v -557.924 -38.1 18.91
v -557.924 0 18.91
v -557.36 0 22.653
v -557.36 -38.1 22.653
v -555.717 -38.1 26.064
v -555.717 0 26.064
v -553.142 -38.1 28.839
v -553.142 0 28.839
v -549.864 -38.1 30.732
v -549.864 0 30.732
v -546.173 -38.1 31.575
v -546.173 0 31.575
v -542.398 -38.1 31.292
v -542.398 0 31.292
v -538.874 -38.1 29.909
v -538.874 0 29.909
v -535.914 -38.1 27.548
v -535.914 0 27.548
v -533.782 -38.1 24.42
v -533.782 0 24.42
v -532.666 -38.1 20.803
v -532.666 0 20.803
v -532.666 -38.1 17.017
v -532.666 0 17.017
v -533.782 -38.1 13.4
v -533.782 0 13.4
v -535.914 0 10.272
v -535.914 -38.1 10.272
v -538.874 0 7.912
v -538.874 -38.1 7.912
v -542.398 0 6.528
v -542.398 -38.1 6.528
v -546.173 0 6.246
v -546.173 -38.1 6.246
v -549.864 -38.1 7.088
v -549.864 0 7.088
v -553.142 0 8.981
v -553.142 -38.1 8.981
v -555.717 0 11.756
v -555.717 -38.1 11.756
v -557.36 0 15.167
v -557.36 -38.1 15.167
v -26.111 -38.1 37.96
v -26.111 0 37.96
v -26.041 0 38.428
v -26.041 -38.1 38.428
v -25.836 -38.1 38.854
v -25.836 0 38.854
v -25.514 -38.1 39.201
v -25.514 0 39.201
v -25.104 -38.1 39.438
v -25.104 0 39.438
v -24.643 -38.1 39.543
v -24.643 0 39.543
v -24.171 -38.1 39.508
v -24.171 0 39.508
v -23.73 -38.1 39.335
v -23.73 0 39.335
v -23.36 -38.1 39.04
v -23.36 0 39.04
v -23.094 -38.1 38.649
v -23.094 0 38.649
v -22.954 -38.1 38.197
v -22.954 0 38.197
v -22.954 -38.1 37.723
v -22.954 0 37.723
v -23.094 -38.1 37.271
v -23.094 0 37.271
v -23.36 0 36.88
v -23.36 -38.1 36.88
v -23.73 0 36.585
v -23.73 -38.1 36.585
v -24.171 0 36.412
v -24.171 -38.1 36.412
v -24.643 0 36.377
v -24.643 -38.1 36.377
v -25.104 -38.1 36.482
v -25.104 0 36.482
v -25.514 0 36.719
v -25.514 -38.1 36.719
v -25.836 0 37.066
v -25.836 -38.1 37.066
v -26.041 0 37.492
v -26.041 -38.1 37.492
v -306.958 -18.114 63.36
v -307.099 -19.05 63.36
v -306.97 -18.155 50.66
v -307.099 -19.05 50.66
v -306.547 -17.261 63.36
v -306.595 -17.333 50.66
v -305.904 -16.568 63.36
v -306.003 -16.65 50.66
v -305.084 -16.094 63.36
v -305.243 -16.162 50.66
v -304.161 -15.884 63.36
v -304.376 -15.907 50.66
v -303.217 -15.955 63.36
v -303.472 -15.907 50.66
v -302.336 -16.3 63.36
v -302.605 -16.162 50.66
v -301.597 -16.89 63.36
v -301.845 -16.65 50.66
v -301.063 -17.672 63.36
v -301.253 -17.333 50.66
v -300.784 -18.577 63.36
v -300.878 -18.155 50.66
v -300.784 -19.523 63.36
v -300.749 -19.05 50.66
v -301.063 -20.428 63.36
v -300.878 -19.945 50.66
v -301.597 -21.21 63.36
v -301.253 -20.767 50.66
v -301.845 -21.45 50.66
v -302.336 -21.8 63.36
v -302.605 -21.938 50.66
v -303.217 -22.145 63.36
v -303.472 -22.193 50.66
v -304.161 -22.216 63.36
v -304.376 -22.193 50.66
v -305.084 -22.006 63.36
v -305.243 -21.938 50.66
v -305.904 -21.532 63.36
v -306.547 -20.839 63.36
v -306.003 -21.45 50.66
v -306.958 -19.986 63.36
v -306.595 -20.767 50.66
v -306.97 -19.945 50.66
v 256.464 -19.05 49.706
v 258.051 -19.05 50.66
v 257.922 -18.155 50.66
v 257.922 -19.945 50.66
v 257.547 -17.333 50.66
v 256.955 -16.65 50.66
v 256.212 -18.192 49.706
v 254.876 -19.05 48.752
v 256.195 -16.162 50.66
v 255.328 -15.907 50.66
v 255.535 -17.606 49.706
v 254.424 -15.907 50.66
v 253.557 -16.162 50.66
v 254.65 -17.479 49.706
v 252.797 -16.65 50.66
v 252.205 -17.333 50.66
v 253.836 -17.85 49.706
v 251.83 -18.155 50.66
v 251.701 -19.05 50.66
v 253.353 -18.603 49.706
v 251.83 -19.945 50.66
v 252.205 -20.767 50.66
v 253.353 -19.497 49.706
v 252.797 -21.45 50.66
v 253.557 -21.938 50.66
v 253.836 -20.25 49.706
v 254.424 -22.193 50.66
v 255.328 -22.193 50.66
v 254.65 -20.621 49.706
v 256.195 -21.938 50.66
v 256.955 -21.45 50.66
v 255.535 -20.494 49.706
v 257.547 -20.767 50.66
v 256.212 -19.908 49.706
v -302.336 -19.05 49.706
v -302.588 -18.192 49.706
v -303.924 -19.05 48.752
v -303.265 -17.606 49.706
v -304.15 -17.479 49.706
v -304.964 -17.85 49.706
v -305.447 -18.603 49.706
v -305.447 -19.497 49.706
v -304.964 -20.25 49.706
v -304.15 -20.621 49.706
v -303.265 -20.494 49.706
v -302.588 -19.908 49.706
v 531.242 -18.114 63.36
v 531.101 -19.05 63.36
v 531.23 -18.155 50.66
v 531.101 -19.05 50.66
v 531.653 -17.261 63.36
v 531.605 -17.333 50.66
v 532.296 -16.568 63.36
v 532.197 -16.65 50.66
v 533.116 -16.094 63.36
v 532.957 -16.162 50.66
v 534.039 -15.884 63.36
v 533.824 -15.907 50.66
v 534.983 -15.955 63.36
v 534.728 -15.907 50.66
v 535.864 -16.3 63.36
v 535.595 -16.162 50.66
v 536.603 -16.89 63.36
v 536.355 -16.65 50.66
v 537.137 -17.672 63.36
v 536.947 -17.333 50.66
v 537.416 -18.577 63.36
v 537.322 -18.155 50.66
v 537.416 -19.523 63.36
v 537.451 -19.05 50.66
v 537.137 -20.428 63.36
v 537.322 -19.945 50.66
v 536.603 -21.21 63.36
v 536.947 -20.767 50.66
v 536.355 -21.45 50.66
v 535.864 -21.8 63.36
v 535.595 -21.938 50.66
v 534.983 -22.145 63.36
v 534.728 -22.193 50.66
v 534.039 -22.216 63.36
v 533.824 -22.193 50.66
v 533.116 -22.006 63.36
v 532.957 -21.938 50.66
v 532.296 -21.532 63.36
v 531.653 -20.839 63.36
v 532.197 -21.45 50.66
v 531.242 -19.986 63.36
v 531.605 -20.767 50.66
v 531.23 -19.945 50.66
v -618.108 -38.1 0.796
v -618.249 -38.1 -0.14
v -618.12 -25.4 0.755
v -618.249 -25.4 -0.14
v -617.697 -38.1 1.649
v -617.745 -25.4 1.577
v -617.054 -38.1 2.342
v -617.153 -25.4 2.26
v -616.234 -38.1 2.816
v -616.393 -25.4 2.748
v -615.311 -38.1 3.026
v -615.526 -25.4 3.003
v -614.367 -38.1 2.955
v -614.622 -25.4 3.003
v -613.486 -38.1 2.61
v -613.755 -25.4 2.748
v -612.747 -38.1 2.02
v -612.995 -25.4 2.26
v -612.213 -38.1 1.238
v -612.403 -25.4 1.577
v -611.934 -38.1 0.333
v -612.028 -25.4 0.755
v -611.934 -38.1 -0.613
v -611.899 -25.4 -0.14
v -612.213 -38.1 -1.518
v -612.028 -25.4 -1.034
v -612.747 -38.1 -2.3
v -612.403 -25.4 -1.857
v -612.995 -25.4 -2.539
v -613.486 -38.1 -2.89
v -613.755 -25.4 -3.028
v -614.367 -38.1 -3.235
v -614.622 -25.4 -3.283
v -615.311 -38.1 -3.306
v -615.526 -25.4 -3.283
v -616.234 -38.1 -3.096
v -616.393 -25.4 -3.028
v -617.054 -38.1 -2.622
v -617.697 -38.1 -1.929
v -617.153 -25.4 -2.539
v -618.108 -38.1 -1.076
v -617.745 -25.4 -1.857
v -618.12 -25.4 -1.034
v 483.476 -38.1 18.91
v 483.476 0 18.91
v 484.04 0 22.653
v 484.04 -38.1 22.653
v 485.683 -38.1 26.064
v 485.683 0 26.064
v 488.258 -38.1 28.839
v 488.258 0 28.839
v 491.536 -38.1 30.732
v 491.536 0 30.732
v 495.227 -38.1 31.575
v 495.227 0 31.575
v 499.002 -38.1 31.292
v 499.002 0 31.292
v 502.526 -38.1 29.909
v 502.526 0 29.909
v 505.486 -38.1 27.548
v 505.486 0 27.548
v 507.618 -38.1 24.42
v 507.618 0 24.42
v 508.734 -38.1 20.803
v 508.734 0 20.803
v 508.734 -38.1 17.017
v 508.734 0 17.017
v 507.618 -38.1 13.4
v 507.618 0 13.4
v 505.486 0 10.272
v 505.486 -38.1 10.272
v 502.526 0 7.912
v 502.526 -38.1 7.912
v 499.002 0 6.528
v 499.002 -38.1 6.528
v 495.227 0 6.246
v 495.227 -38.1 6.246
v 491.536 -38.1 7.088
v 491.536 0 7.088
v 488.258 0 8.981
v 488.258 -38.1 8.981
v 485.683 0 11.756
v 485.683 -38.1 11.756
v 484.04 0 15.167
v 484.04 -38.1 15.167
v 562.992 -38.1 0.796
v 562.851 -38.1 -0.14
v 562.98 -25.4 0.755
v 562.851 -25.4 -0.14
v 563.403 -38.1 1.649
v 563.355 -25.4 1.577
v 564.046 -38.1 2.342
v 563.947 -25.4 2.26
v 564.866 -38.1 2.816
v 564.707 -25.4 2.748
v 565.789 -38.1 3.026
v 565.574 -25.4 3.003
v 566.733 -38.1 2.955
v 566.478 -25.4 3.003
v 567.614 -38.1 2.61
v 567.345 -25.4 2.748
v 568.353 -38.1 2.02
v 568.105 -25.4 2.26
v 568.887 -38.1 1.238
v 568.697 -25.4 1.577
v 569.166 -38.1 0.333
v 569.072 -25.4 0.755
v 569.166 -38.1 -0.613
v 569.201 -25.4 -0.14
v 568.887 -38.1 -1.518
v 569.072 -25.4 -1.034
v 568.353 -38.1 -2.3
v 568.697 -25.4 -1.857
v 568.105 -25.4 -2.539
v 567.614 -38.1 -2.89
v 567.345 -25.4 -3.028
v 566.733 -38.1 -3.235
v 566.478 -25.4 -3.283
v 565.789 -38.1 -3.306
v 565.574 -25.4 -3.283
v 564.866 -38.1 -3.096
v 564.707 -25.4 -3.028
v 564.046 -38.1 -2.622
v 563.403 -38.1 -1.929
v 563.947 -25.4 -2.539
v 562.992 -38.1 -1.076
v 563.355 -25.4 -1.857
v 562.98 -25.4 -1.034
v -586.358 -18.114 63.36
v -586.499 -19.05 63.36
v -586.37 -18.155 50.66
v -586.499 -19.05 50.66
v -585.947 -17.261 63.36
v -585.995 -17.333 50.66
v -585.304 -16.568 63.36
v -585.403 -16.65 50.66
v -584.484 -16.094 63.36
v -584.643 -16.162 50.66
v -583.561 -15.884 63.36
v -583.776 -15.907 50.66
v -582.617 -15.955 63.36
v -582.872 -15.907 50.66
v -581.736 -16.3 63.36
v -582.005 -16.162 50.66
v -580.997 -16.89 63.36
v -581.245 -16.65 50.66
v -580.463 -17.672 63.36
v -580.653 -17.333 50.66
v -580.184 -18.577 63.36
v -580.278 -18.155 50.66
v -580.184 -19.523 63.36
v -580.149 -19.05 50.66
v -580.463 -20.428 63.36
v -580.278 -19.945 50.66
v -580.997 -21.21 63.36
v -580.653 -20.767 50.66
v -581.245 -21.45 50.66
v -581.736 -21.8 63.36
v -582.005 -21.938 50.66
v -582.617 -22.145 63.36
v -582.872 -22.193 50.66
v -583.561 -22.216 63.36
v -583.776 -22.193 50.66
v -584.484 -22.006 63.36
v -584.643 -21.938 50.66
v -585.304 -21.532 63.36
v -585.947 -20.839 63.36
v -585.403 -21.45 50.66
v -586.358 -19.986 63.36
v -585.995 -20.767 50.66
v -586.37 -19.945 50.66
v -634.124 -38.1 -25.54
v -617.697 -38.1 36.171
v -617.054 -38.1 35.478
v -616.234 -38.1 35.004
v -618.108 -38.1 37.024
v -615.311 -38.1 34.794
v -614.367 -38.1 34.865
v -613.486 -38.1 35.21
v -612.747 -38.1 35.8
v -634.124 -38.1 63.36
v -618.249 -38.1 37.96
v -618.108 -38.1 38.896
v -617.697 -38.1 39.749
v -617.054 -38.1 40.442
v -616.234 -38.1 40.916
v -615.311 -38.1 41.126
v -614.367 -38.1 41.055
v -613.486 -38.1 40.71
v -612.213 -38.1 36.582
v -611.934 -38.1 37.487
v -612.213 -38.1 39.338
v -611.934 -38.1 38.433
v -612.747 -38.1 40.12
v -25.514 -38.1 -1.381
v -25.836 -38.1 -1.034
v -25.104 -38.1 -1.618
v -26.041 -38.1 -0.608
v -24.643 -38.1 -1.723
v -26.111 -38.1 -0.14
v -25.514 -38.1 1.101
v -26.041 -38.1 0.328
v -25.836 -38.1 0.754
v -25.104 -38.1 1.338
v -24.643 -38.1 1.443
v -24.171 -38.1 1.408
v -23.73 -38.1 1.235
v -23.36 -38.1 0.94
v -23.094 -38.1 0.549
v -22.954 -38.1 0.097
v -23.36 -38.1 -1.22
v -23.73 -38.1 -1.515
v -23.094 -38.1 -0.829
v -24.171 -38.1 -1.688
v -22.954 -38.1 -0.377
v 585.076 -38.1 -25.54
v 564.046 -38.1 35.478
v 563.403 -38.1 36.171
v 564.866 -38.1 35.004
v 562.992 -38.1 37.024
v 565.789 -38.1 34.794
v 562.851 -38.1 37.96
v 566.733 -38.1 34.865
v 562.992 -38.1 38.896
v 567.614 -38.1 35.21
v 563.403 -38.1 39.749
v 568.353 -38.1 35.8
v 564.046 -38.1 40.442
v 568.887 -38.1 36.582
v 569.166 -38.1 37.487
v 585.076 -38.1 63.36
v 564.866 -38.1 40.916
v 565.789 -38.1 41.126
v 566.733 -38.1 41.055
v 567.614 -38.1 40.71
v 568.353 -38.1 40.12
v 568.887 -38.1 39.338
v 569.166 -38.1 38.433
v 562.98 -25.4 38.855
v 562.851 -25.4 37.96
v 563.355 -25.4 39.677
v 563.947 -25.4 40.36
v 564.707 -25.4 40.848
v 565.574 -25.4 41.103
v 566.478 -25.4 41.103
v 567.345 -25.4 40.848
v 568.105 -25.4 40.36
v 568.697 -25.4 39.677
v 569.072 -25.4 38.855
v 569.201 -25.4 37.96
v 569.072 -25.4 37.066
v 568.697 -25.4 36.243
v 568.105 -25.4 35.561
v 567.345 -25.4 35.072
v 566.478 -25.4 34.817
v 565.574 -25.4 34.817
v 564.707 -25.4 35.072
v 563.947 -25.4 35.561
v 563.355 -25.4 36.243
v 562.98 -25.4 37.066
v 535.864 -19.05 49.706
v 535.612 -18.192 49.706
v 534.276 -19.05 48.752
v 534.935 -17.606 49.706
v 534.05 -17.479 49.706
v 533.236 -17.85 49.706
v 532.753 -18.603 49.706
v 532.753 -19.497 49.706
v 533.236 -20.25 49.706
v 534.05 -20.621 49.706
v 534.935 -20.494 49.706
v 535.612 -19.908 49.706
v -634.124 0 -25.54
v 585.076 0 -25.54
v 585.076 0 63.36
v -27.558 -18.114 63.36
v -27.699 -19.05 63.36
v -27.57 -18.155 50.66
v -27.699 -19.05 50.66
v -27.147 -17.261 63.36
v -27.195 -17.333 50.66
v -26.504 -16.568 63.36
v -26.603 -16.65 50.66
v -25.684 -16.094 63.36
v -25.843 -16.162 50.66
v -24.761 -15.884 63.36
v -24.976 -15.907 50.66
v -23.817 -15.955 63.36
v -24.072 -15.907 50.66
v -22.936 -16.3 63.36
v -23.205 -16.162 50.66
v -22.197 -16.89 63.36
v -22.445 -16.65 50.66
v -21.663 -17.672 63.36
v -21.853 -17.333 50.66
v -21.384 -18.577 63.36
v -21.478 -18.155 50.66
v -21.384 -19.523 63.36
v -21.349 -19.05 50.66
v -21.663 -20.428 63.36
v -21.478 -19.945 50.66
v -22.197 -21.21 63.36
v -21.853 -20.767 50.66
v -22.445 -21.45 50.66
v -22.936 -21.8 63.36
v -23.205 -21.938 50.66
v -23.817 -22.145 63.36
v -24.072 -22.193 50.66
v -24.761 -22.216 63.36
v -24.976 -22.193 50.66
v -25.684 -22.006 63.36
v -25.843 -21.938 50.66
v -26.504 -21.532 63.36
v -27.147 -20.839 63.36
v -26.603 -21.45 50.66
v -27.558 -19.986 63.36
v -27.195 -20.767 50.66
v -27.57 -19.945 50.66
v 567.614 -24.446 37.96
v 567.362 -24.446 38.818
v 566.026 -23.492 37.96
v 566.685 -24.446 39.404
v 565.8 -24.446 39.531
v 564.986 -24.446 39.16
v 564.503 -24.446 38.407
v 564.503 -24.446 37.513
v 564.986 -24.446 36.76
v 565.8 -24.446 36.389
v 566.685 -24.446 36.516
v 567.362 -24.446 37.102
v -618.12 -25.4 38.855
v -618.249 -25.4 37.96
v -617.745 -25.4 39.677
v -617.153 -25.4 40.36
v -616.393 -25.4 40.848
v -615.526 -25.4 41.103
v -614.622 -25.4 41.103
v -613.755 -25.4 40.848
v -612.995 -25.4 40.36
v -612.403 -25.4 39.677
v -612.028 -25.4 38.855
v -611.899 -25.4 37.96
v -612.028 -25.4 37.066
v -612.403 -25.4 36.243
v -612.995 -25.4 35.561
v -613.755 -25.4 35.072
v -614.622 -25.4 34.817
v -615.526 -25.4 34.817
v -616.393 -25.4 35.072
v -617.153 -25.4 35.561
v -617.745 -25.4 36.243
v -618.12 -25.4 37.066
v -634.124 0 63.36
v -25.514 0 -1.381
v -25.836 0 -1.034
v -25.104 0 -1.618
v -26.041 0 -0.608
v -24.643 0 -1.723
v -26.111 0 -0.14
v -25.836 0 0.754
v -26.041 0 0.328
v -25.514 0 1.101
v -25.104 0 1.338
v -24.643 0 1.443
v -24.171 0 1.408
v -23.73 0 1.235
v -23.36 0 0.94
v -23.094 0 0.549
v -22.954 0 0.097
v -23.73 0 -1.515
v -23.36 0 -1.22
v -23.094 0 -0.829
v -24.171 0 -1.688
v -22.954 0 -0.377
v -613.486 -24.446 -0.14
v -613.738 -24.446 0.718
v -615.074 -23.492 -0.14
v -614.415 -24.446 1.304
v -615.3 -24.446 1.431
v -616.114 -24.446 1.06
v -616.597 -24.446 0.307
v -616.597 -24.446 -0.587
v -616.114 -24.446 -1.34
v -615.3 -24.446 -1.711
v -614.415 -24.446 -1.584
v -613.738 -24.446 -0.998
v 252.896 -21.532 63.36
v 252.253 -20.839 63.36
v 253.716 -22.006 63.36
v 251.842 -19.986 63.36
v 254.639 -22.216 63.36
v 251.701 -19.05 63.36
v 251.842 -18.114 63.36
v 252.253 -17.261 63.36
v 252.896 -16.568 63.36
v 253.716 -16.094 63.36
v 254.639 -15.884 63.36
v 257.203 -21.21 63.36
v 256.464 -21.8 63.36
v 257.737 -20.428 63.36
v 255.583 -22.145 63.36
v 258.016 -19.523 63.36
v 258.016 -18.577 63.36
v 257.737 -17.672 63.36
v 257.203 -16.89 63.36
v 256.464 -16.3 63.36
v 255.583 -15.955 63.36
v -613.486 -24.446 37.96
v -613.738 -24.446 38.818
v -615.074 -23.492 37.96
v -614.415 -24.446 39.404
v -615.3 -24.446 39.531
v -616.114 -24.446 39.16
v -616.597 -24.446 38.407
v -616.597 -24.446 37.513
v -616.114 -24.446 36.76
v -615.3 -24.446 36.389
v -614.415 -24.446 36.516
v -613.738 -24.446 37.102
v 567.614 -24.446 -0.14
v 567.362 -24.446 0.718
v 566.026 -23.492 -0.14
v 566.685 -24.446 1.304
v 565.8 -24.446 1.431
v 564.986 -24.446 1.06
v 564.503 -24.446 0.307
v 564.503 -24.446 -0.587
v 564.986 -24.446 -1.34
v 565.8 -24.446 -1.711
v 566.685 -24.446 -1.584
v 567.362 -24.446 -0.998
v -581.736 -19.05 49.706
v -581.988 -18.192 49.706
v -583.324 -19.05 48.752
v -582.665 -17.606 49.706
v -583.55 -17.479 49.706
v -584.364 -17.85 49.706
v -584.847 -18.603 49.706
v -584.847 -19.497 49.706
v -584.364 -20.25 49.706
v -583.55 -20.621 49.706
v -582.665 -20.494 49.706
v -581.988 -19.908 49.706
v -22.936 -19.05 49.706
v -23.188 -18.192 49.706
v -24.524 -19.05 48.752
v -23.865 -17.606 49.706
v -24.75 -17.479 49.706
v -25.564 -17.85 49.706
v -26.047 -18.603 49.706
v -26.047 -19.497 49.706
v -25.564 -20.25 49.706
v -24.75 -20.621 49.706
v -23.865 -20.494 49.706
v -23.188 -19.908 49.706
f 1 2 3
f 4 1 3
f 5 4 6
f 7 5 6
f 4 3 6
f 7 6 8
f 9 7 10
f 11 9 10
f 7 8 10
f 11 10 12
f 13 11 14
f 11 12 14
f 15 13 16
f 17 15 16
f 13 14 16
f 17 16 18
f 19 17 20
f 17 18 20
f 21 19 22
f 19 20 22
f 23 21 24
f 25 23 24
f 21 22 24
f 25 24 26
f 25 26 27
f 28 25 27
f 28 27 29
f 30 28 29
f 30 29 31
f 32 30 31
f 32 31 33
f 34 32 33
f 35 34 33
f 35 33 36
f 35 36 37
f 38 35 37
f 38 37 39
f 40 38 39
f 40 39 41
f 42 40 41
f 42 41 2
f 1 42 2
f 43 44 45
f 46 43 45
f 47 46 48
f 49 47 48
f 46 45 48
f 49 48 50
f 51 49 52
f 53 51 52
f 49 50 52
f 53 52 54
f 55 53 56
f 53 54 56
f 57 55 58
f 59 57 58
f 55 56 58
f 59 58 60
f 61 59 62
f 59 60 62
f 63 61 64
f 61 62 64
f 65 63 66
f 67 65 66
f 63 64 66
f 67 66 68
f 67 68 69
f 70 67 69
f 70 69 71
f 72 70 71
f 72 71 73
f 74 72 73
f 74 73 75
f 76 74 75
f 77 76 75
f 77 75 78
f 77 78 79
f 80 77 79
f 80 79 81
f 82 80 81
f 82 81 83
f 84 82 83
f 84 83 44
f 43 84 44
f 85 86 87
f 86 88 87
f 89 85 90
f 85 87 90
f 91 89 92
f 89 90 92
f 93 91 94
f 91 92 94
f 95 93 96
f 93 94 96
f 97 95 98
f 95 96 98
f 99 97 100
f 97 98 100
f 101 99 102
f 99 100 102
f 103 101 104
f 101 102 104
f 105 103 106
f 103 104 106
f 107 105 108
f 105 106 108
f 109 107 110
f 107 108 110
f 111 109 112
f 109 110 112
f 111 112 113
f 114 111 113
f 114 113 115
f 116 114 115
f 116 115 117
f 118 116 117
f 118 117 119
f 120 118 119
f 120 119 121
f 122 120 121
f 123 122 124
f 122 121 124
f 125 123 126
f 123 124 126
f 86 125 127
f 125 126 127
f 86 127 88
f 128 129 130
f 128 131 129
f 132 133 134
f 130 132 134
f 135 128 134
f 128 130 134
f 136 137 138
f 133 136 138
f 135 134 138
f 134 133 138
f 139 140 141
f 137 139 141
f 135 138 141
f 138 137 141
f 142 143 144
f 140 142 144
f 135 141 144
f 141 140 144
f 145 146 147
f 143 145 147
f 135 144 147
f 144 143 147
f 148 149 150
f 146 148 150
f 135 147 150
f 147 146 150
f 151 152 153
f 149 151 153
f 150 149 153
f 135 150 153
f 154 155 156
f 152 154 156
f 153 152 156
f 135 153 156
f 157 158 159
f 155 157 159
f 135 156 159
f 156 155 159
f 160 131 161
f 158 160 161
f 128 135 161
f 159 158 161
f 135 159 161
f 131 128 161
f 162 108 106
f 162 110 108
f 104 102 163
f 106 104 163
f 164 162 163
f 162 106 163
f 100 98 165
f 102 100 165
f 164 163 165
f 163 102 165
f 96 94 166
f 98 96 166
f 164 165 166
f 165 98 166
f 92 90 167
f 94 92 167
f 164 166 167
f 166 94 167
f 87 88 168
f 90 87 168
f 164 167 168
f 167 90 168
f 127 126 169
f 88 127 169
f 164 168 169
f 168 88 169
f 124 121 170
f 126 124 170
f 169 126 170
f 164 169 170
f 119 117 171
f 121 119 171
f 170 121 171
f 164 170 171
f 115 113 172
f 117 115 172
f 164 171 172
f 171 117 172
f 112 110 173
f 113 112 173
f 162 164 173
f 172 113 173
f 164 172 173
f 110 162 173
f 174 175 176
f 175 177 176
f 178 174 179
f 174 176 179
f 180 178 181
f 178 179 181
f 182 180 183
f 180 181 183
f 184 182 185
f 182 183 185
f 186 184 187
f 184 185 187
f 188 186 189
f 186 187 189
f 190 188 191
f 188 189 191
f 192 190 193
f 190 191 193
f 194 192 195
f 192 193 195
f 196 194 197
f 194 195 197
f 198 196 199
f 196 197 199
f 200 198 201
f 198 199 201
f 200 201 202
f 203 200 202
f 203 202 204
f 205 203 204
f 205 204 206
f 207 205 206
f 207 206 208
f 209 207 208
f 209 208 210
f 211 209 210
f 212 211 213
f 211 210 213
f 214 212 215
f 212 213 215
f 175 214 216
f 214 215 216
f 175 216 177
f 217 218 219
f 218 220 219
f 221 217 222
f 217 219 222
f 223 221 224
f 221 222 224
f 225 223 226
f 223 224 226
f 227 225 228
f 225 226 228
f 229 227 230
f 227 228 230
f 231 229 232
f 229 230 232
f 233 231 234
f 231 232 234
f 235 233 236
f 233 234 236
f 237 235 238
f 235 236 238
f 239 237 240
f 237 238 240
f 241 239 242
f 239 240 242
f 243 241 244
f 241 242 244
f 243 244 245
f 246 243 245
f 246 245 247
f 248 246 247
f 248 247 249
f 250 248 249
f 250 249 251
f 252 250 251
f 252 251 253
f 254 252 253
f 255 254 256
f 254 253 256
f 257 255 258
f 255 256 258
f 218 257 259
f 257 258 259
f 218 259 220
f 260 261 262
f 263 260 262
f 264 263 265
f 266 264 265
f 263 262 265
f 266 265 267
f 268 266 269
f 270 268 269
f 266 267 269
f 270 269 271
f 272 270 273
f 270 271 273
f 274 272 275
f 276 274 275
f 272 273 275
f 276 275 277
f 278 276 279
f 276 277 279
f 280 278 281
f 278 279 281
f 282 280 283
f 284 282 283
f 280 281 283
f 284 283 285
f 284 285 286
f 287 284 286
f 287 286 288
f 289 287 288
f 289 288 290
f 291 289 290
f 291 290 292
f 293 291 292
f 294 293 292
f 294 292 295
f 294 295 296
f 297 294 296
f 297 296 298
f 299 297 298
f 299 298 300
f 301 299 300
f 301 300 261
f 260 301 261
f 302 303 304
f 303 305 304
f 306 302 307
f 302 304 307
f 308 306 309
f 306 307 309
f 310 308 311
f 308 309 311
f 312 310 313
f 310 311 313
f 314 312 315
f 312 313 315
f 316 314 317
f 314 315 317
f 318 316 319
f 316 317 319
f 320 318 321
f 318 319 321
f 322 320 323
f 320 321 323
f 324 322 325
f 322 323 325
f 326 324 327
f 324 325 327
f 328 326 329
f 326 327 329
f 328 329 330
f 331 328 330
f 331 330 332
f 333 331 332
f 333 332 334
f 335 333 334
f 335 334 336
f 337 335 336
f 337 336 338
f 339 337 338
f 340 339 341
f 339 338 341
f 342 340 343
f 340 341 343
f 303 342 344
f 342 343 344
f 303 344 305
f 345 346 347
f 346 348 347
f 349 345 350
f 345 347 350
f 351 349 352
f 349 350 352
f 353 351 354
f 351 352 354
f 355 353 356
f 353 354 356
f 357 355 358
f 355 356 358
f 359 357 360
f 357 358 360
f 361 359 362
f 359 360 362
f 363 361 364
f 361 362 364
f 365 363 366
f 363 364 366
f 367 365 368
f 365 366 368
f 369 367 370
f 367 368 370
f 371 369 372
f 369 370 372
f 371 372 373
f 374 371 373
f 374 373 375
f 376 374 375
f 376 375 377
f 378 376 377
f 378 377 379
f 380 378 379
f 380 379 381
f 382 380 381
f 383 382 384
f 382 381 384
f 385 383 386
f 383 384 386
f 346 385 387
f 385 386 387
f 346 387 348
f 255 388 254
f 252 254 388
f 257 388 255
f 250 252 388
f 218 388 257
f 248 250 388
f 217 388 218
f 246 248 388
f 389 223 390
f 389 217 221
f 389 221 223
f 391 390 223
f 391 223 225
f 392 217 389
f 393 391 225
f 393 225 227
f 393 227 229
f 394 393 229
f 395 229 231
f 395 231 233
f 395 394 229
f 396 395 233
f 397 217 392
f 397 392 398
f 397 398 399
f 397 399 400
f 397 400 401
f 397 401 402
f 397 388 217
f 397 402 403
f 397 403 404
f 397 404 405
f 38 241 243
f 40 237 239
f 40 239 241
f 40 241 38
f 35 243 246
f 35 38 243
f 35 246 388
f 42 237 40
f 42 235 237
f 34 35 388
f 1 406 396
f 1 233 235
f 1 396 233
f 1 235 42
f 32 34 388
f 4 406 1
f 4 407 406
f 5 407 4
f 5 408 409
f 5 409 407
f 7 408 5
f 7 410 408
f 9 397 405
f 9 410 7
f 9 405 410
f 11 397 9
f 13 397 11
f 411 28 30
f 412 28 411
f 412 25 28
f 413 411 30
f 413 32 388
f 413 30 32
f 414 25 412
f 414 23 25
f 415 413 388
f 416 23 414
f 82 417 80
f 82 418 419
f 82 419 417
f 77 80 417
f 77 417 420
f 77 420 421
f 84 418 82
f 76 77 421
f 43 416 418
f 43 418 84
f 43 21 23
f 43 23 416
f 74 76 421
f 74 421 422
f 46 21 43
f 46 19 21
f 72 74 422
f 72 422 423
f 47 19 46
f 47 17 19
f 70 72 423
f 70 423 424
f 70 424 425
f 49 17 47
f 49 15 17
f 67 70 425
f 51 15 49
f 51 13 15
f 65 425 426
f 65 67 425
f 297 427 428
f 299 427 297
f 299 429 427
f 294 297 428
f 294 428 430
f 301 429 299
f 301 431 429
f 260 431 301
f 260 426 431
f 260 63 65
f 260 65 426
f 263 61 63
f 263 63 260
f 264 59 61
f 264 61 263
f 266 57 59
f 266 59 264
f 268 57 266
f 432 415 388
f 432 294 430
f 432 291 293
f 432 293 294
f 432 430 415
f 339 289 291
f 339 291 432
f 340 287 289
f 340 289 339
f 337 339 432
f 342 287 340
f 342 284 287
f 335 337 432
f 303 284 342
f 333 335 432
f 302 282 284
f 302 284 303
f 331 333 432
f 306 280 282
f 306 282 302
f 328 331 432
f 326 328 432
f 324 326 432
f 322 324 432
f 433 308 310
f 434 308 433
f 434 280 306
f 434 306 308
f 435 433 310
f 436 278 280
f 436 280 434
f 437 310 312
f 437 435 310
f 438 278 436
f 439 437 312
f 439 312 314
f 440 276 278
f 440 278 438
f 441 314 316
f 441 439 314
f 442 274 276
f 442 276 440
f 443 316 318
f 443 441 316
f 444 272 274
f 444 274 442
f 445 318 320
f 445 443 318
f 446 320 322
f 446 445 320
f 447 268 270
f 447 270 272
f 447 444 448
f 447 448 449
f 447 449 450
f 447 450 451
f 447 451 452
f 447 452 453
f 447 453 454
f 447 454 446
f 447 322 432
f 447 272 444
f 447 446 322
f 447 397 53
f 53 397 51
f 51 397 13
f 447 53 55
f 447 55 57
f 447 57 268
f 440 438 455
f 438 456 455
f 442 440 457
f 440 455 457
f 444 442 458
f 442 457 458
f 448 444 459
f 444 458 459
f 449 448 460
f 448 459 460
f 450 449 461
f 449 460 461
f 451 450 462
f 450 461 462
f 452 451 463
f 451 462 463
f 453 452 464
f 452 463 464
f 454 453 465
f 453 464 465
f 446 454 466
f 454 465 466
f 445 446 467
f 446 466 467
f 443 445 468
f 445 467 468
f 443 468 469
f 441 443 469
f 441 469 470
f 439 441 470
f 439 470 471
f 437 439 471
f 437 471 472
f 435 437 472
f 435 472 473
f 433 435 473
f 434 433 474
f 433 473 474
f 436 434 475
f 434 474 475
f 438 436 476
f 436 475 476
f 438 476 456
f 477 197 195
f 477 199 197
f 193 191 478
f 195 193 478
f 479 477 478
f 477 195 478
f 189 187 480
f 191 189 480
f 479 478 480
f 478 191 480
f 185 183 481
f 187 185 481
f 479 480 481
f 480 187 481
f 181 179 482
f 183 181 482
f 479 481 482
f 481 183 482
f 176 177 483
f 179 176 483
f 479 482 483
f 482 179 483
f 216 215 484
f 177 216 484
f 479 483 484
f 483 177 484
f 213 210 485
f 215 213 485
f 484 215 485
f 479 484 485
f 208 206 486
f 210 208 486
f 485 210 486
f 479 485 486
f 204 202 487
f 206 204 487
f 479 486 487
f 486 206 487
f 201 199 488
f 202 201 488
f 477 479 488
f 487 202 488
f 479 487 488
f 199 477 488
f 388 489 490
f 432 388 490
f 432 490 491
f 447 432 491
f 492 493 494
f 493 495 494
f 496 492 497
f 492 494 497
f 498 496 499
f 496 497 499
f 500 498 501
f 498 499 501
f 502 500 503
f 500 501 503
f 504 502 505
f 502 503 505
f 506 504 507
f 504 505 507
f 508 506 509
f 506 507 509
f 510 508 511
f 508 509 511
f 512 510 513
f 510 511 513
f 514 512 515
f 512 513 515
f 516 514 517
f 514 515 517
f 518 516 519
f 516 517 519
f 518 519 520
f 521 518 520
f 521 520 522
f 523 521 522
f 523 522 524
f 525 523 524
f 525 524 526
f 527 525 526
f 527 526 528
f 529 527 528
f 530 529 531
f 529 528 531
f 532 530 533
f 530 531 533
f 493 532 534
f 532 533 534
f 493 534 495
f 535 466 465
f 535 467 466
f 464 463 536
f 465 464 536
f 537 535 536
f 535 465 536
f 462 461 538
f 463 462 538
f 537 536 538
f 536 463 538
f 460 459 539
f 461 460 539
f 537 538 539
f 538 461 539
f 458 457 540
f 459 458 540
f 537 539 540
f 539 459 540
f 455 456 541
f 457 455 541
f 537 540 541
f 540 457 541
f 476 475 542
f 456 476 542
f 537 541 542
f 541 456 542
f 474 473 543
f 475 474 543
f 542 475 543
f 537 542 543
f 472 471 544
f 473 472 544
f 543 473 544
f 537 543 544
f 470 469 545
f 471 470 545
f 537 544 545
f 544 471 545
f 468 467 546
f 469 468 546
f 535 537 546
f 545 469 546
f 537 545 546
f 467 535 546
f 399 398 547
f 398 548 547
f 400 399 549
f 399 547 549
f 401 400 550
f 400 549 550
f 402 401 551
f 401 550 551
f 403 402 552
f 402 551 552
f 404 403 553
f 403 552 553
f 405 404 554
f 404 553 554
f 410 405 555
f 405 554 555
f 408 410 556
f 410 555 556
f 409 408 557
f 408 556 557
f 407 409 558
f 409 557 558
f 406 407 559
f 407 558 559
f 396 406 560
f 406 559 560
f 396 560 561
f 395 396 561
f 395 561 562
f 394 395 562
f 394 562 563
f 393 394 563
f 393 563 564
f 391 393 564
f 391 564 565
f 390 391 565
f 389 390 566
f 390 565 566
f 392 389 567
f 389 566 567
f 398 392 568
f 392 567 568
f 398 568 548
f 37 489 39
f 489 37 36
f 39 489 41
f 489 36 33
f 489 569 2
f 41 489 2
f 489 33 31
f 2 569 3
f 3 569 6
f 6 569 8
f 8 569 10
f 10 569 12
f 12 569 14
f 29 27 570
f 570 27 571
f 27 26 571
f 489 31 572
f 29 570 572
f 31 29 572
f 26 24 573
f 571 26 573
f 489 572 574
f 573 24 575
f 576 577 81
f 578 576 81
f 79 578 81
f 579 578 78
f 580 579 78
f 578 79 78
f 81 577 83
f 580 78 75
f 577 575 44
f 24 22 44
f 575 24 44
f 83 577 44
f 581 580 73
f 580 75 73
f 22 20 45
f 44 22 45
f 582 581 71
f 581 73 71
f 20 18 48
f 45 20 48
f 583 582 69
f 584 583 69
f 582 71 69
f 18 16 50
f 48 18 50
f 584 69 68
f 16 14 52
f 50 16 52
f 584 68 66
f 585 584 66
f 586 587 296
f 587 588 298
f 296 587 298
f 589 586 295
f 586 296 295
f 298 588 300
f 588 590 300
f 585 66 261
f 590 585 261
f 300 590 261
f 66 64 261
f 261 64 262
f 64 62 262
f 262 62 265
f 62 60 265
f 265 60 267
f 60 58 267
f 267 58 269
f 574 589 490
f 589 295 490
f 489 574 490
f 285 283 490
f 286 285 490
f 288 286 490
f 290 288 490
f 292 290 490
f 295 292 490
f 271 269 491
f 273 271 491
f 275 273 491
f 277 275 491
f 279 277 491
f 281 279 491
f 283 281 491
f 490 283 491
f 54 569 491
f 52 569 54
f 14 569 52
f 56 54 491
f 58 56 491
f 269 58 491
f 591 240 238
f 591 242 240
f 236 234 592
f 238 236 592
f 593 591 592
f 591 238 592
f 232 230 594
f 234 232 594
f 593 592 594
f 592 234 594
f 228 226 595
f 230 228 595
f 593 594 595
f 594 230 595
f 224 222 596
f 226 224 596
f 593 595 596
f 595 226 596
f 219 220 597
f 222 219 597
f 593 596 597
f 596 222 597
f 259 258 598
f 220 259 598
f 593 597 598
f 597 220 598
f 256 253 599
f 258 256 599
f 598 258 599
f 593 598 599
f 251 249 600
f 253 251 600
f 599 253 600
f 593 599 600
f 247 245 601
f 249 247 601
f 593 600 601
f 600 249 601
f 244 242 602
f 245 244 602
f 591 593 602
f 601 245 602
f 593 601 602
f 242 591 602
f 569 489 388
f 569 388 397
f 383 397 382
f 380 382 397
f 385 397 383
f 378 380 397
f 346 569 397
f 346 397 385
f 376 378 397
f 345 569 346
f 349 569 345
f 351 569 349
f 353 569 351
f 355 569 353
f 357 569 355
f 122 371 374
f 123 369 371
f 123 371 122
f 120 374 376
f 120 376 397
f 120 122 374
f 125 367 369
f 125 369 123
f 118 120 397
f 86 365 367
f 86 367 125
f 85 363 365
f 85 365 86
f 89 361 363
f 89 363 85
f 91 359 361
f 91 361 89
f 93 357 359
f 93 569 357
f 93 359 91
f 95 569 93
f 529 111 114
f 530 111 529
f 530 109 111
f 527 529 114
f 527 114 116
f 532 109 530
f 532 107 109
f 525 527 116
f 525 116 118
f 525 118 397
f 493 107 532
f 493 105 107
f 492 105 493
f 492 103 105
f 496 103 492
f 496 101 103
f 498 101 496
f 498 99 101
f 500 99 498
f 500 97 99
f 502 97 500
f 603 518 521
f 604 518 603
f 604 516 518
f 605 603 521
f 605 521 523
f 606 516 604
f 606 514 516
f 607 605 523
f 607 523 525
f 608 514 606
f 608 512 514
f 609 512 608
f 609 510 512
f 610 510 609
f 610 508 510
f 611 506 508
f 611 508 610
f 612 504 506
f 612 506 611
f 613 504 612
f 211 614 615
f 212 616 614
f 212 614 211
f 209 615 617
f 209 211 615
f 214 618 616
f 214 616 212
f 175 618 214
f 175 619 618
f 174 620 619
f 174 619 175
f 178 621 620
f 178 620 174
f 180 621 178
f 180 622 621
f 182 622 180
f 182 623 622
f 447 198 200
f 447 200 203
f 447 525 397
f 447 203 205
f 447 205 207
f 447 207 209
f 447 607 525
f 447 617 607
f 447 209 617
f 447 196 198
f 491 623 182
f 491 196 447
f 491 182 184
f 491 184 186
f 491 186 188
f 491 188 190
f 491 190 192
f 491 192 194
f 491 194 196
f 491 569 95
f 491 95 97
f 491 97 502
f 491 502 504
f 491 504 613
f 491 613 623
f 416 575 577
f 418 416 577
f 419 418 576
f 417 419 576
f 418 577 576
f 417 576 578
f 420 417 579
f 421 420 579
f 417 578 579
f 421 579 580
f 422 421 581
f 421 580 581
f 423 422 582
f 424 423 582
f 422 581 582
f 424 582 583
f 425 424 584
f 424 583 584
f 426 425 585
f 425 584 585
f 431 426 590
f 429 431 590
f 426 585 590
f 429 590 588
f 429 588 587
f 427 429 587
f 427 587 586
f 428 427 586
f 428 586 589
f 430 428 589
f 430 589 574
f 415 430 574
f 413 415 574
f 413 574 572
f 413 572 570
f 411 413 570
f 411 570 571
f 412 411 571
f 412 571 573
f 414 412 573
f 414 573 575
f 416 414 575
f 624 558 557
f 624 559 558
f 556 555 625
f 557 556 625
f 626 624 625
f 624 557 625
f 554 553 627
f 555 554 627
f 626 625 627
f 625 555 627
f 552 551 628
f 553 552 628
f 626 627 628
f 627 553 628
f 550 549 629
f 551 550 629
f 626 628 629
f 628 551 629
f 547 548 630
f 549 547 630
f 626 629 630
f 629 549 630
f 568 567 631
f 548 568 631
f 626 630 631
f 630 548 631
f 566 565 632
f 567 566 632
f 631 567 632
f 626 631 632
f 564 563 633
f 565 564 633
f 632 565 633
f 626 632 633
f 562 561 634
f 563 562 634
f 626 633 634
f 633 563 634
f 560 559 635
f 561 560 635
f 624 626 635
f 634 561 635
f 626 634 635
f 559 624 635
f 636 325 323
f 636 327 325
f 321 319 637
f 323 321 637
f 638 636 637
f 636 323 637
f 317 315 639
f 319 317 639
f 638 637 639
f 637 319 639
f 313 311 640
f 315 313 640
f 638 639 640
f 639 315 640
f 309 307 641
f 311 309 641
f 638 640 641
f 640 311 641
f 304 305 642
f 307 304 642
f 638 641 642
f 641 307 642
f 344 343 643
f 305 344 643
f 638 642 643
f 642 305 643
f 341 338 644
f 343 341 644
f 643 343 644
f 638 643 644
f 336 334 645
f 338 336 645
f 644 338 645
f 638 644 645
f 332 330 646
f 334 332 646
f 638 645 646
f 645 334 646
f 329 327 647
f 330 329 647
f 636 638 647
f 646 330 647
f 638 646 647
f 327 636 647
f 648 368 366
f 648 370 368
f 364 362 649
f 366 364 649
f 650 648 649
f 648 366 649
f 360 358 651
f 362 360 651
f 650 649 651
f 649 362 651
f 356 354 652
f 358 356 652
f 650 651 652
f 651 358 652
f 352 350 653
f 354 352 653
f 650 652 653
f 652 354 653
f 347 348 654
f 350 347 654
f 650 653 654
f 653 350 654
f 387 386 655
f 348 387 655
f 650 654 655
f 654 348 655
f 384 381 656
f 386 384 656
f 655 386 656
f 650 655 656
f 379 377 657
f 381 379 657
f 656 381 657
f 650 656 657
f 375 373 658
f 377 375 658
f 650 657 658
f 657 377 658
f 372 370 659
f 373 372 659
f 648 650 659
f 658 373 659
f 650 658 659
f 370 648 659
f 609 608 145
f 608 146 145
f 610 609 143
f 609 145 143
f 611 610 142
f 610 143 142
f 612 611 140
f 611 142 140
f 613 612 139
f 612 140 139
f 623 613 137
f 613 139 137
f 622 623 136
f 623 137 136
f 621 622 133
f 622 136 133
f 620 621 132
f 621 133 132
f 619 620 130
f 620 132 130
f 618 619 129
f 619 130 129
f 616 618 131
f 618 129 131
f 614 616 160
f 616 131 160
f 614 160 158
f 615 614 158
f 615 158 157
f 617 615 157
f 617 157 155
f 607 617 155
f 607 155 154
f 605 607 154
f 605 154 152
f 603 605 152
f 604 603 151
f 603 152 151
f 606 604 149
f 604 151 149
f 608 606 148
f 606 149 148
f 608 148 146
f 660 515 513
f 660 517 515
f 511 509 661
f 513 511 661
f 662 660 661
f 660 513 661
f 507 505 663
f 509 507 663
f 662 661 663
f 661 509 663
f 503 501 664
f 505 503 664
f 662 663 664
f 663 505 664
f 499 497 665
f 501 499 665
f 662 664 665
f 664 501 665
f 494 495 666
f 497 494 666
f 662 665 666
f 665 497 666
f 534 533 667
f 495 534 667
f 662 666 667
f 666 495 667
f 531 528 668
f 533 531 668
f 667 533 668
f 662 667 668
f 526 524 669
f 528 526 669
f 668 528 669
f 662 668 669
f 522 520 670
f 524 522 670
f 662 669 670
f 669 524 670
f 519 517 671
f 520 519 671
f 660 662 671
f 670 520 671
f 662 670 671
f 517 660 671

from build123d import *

# Parameters (mm, degrees)
F0_W     = 1219.2
F0_H     = 88.9
F1_DEPTH = 38.1
F3_D     = 6.35
F3_DEPTH = 12.7
F3_TIP   = 1.9077324654
F5_D     = 6.35
F5_DEPTH = 12.7
F5_TIP   = 1.9077324654
F7_D     = 25.4
F9_D     = 3.175


with BuildPart() as f1:
    # F0 (on Front) → F1 (new body)
    with BuildSketch(Plane.XZ):
        with Locations((-24.523974567, 18.9100238495)):
            Rectangle(F0_W, F0_H)
    extrude(amount=F1_DEPTH)

    # F3
    with Locations(Plane.XZ.offset(38.1)):
        with Locations((566.026025433, 37.9600238495), (566.026025433, -0.1399761505), (-615.073974567, 37.9600238495), (-615.073974567, -0.1399761505)):
            Hole(F3_D / 2, depth=F3_DEPTH)
            with Locations((0, 0, -(F3_DEPTH + F3_TIP / 2))):  # 118° drill point
                Cone(0, F3_D / 2, F3_TIP, mode=Mode.SUBTRACT)

    # F5
    with Locations(Plane.XY.offset(63.3600238495)):
        with Locations((-583.323974567, -19.05), (-303.923974567, -19.05), (-24.523974567, -19.05), (254.876025433, -19.05), (534.276025433, -19.05)):
            Hole(F5_D / 2, depth=F5_DEPTH)
            with Locations((0, 0, -(F5_DEPTH + F5_TIP / 2))):  # 118° drill point
                Cone(0, F5_D / 2, F5_TIP, mode=Mode.SUBTRACT)

    # F7 (through all)
    with Locations(Plane.XZ.offset(38.1)):
        with Locations((-545.223974567, 18.9100238495), (496.176025433, 18.9100238495)):
            Hole(F7_D / 2)

    # F9 (through all)
    with Locations(Plane.XZ.offset(38.1)):
        with Locations((-24.523974567, 37.9600238495), (-24.523974567, -0.1399761505)):
            Hole(F9_D / 2)


solid = f1.part
